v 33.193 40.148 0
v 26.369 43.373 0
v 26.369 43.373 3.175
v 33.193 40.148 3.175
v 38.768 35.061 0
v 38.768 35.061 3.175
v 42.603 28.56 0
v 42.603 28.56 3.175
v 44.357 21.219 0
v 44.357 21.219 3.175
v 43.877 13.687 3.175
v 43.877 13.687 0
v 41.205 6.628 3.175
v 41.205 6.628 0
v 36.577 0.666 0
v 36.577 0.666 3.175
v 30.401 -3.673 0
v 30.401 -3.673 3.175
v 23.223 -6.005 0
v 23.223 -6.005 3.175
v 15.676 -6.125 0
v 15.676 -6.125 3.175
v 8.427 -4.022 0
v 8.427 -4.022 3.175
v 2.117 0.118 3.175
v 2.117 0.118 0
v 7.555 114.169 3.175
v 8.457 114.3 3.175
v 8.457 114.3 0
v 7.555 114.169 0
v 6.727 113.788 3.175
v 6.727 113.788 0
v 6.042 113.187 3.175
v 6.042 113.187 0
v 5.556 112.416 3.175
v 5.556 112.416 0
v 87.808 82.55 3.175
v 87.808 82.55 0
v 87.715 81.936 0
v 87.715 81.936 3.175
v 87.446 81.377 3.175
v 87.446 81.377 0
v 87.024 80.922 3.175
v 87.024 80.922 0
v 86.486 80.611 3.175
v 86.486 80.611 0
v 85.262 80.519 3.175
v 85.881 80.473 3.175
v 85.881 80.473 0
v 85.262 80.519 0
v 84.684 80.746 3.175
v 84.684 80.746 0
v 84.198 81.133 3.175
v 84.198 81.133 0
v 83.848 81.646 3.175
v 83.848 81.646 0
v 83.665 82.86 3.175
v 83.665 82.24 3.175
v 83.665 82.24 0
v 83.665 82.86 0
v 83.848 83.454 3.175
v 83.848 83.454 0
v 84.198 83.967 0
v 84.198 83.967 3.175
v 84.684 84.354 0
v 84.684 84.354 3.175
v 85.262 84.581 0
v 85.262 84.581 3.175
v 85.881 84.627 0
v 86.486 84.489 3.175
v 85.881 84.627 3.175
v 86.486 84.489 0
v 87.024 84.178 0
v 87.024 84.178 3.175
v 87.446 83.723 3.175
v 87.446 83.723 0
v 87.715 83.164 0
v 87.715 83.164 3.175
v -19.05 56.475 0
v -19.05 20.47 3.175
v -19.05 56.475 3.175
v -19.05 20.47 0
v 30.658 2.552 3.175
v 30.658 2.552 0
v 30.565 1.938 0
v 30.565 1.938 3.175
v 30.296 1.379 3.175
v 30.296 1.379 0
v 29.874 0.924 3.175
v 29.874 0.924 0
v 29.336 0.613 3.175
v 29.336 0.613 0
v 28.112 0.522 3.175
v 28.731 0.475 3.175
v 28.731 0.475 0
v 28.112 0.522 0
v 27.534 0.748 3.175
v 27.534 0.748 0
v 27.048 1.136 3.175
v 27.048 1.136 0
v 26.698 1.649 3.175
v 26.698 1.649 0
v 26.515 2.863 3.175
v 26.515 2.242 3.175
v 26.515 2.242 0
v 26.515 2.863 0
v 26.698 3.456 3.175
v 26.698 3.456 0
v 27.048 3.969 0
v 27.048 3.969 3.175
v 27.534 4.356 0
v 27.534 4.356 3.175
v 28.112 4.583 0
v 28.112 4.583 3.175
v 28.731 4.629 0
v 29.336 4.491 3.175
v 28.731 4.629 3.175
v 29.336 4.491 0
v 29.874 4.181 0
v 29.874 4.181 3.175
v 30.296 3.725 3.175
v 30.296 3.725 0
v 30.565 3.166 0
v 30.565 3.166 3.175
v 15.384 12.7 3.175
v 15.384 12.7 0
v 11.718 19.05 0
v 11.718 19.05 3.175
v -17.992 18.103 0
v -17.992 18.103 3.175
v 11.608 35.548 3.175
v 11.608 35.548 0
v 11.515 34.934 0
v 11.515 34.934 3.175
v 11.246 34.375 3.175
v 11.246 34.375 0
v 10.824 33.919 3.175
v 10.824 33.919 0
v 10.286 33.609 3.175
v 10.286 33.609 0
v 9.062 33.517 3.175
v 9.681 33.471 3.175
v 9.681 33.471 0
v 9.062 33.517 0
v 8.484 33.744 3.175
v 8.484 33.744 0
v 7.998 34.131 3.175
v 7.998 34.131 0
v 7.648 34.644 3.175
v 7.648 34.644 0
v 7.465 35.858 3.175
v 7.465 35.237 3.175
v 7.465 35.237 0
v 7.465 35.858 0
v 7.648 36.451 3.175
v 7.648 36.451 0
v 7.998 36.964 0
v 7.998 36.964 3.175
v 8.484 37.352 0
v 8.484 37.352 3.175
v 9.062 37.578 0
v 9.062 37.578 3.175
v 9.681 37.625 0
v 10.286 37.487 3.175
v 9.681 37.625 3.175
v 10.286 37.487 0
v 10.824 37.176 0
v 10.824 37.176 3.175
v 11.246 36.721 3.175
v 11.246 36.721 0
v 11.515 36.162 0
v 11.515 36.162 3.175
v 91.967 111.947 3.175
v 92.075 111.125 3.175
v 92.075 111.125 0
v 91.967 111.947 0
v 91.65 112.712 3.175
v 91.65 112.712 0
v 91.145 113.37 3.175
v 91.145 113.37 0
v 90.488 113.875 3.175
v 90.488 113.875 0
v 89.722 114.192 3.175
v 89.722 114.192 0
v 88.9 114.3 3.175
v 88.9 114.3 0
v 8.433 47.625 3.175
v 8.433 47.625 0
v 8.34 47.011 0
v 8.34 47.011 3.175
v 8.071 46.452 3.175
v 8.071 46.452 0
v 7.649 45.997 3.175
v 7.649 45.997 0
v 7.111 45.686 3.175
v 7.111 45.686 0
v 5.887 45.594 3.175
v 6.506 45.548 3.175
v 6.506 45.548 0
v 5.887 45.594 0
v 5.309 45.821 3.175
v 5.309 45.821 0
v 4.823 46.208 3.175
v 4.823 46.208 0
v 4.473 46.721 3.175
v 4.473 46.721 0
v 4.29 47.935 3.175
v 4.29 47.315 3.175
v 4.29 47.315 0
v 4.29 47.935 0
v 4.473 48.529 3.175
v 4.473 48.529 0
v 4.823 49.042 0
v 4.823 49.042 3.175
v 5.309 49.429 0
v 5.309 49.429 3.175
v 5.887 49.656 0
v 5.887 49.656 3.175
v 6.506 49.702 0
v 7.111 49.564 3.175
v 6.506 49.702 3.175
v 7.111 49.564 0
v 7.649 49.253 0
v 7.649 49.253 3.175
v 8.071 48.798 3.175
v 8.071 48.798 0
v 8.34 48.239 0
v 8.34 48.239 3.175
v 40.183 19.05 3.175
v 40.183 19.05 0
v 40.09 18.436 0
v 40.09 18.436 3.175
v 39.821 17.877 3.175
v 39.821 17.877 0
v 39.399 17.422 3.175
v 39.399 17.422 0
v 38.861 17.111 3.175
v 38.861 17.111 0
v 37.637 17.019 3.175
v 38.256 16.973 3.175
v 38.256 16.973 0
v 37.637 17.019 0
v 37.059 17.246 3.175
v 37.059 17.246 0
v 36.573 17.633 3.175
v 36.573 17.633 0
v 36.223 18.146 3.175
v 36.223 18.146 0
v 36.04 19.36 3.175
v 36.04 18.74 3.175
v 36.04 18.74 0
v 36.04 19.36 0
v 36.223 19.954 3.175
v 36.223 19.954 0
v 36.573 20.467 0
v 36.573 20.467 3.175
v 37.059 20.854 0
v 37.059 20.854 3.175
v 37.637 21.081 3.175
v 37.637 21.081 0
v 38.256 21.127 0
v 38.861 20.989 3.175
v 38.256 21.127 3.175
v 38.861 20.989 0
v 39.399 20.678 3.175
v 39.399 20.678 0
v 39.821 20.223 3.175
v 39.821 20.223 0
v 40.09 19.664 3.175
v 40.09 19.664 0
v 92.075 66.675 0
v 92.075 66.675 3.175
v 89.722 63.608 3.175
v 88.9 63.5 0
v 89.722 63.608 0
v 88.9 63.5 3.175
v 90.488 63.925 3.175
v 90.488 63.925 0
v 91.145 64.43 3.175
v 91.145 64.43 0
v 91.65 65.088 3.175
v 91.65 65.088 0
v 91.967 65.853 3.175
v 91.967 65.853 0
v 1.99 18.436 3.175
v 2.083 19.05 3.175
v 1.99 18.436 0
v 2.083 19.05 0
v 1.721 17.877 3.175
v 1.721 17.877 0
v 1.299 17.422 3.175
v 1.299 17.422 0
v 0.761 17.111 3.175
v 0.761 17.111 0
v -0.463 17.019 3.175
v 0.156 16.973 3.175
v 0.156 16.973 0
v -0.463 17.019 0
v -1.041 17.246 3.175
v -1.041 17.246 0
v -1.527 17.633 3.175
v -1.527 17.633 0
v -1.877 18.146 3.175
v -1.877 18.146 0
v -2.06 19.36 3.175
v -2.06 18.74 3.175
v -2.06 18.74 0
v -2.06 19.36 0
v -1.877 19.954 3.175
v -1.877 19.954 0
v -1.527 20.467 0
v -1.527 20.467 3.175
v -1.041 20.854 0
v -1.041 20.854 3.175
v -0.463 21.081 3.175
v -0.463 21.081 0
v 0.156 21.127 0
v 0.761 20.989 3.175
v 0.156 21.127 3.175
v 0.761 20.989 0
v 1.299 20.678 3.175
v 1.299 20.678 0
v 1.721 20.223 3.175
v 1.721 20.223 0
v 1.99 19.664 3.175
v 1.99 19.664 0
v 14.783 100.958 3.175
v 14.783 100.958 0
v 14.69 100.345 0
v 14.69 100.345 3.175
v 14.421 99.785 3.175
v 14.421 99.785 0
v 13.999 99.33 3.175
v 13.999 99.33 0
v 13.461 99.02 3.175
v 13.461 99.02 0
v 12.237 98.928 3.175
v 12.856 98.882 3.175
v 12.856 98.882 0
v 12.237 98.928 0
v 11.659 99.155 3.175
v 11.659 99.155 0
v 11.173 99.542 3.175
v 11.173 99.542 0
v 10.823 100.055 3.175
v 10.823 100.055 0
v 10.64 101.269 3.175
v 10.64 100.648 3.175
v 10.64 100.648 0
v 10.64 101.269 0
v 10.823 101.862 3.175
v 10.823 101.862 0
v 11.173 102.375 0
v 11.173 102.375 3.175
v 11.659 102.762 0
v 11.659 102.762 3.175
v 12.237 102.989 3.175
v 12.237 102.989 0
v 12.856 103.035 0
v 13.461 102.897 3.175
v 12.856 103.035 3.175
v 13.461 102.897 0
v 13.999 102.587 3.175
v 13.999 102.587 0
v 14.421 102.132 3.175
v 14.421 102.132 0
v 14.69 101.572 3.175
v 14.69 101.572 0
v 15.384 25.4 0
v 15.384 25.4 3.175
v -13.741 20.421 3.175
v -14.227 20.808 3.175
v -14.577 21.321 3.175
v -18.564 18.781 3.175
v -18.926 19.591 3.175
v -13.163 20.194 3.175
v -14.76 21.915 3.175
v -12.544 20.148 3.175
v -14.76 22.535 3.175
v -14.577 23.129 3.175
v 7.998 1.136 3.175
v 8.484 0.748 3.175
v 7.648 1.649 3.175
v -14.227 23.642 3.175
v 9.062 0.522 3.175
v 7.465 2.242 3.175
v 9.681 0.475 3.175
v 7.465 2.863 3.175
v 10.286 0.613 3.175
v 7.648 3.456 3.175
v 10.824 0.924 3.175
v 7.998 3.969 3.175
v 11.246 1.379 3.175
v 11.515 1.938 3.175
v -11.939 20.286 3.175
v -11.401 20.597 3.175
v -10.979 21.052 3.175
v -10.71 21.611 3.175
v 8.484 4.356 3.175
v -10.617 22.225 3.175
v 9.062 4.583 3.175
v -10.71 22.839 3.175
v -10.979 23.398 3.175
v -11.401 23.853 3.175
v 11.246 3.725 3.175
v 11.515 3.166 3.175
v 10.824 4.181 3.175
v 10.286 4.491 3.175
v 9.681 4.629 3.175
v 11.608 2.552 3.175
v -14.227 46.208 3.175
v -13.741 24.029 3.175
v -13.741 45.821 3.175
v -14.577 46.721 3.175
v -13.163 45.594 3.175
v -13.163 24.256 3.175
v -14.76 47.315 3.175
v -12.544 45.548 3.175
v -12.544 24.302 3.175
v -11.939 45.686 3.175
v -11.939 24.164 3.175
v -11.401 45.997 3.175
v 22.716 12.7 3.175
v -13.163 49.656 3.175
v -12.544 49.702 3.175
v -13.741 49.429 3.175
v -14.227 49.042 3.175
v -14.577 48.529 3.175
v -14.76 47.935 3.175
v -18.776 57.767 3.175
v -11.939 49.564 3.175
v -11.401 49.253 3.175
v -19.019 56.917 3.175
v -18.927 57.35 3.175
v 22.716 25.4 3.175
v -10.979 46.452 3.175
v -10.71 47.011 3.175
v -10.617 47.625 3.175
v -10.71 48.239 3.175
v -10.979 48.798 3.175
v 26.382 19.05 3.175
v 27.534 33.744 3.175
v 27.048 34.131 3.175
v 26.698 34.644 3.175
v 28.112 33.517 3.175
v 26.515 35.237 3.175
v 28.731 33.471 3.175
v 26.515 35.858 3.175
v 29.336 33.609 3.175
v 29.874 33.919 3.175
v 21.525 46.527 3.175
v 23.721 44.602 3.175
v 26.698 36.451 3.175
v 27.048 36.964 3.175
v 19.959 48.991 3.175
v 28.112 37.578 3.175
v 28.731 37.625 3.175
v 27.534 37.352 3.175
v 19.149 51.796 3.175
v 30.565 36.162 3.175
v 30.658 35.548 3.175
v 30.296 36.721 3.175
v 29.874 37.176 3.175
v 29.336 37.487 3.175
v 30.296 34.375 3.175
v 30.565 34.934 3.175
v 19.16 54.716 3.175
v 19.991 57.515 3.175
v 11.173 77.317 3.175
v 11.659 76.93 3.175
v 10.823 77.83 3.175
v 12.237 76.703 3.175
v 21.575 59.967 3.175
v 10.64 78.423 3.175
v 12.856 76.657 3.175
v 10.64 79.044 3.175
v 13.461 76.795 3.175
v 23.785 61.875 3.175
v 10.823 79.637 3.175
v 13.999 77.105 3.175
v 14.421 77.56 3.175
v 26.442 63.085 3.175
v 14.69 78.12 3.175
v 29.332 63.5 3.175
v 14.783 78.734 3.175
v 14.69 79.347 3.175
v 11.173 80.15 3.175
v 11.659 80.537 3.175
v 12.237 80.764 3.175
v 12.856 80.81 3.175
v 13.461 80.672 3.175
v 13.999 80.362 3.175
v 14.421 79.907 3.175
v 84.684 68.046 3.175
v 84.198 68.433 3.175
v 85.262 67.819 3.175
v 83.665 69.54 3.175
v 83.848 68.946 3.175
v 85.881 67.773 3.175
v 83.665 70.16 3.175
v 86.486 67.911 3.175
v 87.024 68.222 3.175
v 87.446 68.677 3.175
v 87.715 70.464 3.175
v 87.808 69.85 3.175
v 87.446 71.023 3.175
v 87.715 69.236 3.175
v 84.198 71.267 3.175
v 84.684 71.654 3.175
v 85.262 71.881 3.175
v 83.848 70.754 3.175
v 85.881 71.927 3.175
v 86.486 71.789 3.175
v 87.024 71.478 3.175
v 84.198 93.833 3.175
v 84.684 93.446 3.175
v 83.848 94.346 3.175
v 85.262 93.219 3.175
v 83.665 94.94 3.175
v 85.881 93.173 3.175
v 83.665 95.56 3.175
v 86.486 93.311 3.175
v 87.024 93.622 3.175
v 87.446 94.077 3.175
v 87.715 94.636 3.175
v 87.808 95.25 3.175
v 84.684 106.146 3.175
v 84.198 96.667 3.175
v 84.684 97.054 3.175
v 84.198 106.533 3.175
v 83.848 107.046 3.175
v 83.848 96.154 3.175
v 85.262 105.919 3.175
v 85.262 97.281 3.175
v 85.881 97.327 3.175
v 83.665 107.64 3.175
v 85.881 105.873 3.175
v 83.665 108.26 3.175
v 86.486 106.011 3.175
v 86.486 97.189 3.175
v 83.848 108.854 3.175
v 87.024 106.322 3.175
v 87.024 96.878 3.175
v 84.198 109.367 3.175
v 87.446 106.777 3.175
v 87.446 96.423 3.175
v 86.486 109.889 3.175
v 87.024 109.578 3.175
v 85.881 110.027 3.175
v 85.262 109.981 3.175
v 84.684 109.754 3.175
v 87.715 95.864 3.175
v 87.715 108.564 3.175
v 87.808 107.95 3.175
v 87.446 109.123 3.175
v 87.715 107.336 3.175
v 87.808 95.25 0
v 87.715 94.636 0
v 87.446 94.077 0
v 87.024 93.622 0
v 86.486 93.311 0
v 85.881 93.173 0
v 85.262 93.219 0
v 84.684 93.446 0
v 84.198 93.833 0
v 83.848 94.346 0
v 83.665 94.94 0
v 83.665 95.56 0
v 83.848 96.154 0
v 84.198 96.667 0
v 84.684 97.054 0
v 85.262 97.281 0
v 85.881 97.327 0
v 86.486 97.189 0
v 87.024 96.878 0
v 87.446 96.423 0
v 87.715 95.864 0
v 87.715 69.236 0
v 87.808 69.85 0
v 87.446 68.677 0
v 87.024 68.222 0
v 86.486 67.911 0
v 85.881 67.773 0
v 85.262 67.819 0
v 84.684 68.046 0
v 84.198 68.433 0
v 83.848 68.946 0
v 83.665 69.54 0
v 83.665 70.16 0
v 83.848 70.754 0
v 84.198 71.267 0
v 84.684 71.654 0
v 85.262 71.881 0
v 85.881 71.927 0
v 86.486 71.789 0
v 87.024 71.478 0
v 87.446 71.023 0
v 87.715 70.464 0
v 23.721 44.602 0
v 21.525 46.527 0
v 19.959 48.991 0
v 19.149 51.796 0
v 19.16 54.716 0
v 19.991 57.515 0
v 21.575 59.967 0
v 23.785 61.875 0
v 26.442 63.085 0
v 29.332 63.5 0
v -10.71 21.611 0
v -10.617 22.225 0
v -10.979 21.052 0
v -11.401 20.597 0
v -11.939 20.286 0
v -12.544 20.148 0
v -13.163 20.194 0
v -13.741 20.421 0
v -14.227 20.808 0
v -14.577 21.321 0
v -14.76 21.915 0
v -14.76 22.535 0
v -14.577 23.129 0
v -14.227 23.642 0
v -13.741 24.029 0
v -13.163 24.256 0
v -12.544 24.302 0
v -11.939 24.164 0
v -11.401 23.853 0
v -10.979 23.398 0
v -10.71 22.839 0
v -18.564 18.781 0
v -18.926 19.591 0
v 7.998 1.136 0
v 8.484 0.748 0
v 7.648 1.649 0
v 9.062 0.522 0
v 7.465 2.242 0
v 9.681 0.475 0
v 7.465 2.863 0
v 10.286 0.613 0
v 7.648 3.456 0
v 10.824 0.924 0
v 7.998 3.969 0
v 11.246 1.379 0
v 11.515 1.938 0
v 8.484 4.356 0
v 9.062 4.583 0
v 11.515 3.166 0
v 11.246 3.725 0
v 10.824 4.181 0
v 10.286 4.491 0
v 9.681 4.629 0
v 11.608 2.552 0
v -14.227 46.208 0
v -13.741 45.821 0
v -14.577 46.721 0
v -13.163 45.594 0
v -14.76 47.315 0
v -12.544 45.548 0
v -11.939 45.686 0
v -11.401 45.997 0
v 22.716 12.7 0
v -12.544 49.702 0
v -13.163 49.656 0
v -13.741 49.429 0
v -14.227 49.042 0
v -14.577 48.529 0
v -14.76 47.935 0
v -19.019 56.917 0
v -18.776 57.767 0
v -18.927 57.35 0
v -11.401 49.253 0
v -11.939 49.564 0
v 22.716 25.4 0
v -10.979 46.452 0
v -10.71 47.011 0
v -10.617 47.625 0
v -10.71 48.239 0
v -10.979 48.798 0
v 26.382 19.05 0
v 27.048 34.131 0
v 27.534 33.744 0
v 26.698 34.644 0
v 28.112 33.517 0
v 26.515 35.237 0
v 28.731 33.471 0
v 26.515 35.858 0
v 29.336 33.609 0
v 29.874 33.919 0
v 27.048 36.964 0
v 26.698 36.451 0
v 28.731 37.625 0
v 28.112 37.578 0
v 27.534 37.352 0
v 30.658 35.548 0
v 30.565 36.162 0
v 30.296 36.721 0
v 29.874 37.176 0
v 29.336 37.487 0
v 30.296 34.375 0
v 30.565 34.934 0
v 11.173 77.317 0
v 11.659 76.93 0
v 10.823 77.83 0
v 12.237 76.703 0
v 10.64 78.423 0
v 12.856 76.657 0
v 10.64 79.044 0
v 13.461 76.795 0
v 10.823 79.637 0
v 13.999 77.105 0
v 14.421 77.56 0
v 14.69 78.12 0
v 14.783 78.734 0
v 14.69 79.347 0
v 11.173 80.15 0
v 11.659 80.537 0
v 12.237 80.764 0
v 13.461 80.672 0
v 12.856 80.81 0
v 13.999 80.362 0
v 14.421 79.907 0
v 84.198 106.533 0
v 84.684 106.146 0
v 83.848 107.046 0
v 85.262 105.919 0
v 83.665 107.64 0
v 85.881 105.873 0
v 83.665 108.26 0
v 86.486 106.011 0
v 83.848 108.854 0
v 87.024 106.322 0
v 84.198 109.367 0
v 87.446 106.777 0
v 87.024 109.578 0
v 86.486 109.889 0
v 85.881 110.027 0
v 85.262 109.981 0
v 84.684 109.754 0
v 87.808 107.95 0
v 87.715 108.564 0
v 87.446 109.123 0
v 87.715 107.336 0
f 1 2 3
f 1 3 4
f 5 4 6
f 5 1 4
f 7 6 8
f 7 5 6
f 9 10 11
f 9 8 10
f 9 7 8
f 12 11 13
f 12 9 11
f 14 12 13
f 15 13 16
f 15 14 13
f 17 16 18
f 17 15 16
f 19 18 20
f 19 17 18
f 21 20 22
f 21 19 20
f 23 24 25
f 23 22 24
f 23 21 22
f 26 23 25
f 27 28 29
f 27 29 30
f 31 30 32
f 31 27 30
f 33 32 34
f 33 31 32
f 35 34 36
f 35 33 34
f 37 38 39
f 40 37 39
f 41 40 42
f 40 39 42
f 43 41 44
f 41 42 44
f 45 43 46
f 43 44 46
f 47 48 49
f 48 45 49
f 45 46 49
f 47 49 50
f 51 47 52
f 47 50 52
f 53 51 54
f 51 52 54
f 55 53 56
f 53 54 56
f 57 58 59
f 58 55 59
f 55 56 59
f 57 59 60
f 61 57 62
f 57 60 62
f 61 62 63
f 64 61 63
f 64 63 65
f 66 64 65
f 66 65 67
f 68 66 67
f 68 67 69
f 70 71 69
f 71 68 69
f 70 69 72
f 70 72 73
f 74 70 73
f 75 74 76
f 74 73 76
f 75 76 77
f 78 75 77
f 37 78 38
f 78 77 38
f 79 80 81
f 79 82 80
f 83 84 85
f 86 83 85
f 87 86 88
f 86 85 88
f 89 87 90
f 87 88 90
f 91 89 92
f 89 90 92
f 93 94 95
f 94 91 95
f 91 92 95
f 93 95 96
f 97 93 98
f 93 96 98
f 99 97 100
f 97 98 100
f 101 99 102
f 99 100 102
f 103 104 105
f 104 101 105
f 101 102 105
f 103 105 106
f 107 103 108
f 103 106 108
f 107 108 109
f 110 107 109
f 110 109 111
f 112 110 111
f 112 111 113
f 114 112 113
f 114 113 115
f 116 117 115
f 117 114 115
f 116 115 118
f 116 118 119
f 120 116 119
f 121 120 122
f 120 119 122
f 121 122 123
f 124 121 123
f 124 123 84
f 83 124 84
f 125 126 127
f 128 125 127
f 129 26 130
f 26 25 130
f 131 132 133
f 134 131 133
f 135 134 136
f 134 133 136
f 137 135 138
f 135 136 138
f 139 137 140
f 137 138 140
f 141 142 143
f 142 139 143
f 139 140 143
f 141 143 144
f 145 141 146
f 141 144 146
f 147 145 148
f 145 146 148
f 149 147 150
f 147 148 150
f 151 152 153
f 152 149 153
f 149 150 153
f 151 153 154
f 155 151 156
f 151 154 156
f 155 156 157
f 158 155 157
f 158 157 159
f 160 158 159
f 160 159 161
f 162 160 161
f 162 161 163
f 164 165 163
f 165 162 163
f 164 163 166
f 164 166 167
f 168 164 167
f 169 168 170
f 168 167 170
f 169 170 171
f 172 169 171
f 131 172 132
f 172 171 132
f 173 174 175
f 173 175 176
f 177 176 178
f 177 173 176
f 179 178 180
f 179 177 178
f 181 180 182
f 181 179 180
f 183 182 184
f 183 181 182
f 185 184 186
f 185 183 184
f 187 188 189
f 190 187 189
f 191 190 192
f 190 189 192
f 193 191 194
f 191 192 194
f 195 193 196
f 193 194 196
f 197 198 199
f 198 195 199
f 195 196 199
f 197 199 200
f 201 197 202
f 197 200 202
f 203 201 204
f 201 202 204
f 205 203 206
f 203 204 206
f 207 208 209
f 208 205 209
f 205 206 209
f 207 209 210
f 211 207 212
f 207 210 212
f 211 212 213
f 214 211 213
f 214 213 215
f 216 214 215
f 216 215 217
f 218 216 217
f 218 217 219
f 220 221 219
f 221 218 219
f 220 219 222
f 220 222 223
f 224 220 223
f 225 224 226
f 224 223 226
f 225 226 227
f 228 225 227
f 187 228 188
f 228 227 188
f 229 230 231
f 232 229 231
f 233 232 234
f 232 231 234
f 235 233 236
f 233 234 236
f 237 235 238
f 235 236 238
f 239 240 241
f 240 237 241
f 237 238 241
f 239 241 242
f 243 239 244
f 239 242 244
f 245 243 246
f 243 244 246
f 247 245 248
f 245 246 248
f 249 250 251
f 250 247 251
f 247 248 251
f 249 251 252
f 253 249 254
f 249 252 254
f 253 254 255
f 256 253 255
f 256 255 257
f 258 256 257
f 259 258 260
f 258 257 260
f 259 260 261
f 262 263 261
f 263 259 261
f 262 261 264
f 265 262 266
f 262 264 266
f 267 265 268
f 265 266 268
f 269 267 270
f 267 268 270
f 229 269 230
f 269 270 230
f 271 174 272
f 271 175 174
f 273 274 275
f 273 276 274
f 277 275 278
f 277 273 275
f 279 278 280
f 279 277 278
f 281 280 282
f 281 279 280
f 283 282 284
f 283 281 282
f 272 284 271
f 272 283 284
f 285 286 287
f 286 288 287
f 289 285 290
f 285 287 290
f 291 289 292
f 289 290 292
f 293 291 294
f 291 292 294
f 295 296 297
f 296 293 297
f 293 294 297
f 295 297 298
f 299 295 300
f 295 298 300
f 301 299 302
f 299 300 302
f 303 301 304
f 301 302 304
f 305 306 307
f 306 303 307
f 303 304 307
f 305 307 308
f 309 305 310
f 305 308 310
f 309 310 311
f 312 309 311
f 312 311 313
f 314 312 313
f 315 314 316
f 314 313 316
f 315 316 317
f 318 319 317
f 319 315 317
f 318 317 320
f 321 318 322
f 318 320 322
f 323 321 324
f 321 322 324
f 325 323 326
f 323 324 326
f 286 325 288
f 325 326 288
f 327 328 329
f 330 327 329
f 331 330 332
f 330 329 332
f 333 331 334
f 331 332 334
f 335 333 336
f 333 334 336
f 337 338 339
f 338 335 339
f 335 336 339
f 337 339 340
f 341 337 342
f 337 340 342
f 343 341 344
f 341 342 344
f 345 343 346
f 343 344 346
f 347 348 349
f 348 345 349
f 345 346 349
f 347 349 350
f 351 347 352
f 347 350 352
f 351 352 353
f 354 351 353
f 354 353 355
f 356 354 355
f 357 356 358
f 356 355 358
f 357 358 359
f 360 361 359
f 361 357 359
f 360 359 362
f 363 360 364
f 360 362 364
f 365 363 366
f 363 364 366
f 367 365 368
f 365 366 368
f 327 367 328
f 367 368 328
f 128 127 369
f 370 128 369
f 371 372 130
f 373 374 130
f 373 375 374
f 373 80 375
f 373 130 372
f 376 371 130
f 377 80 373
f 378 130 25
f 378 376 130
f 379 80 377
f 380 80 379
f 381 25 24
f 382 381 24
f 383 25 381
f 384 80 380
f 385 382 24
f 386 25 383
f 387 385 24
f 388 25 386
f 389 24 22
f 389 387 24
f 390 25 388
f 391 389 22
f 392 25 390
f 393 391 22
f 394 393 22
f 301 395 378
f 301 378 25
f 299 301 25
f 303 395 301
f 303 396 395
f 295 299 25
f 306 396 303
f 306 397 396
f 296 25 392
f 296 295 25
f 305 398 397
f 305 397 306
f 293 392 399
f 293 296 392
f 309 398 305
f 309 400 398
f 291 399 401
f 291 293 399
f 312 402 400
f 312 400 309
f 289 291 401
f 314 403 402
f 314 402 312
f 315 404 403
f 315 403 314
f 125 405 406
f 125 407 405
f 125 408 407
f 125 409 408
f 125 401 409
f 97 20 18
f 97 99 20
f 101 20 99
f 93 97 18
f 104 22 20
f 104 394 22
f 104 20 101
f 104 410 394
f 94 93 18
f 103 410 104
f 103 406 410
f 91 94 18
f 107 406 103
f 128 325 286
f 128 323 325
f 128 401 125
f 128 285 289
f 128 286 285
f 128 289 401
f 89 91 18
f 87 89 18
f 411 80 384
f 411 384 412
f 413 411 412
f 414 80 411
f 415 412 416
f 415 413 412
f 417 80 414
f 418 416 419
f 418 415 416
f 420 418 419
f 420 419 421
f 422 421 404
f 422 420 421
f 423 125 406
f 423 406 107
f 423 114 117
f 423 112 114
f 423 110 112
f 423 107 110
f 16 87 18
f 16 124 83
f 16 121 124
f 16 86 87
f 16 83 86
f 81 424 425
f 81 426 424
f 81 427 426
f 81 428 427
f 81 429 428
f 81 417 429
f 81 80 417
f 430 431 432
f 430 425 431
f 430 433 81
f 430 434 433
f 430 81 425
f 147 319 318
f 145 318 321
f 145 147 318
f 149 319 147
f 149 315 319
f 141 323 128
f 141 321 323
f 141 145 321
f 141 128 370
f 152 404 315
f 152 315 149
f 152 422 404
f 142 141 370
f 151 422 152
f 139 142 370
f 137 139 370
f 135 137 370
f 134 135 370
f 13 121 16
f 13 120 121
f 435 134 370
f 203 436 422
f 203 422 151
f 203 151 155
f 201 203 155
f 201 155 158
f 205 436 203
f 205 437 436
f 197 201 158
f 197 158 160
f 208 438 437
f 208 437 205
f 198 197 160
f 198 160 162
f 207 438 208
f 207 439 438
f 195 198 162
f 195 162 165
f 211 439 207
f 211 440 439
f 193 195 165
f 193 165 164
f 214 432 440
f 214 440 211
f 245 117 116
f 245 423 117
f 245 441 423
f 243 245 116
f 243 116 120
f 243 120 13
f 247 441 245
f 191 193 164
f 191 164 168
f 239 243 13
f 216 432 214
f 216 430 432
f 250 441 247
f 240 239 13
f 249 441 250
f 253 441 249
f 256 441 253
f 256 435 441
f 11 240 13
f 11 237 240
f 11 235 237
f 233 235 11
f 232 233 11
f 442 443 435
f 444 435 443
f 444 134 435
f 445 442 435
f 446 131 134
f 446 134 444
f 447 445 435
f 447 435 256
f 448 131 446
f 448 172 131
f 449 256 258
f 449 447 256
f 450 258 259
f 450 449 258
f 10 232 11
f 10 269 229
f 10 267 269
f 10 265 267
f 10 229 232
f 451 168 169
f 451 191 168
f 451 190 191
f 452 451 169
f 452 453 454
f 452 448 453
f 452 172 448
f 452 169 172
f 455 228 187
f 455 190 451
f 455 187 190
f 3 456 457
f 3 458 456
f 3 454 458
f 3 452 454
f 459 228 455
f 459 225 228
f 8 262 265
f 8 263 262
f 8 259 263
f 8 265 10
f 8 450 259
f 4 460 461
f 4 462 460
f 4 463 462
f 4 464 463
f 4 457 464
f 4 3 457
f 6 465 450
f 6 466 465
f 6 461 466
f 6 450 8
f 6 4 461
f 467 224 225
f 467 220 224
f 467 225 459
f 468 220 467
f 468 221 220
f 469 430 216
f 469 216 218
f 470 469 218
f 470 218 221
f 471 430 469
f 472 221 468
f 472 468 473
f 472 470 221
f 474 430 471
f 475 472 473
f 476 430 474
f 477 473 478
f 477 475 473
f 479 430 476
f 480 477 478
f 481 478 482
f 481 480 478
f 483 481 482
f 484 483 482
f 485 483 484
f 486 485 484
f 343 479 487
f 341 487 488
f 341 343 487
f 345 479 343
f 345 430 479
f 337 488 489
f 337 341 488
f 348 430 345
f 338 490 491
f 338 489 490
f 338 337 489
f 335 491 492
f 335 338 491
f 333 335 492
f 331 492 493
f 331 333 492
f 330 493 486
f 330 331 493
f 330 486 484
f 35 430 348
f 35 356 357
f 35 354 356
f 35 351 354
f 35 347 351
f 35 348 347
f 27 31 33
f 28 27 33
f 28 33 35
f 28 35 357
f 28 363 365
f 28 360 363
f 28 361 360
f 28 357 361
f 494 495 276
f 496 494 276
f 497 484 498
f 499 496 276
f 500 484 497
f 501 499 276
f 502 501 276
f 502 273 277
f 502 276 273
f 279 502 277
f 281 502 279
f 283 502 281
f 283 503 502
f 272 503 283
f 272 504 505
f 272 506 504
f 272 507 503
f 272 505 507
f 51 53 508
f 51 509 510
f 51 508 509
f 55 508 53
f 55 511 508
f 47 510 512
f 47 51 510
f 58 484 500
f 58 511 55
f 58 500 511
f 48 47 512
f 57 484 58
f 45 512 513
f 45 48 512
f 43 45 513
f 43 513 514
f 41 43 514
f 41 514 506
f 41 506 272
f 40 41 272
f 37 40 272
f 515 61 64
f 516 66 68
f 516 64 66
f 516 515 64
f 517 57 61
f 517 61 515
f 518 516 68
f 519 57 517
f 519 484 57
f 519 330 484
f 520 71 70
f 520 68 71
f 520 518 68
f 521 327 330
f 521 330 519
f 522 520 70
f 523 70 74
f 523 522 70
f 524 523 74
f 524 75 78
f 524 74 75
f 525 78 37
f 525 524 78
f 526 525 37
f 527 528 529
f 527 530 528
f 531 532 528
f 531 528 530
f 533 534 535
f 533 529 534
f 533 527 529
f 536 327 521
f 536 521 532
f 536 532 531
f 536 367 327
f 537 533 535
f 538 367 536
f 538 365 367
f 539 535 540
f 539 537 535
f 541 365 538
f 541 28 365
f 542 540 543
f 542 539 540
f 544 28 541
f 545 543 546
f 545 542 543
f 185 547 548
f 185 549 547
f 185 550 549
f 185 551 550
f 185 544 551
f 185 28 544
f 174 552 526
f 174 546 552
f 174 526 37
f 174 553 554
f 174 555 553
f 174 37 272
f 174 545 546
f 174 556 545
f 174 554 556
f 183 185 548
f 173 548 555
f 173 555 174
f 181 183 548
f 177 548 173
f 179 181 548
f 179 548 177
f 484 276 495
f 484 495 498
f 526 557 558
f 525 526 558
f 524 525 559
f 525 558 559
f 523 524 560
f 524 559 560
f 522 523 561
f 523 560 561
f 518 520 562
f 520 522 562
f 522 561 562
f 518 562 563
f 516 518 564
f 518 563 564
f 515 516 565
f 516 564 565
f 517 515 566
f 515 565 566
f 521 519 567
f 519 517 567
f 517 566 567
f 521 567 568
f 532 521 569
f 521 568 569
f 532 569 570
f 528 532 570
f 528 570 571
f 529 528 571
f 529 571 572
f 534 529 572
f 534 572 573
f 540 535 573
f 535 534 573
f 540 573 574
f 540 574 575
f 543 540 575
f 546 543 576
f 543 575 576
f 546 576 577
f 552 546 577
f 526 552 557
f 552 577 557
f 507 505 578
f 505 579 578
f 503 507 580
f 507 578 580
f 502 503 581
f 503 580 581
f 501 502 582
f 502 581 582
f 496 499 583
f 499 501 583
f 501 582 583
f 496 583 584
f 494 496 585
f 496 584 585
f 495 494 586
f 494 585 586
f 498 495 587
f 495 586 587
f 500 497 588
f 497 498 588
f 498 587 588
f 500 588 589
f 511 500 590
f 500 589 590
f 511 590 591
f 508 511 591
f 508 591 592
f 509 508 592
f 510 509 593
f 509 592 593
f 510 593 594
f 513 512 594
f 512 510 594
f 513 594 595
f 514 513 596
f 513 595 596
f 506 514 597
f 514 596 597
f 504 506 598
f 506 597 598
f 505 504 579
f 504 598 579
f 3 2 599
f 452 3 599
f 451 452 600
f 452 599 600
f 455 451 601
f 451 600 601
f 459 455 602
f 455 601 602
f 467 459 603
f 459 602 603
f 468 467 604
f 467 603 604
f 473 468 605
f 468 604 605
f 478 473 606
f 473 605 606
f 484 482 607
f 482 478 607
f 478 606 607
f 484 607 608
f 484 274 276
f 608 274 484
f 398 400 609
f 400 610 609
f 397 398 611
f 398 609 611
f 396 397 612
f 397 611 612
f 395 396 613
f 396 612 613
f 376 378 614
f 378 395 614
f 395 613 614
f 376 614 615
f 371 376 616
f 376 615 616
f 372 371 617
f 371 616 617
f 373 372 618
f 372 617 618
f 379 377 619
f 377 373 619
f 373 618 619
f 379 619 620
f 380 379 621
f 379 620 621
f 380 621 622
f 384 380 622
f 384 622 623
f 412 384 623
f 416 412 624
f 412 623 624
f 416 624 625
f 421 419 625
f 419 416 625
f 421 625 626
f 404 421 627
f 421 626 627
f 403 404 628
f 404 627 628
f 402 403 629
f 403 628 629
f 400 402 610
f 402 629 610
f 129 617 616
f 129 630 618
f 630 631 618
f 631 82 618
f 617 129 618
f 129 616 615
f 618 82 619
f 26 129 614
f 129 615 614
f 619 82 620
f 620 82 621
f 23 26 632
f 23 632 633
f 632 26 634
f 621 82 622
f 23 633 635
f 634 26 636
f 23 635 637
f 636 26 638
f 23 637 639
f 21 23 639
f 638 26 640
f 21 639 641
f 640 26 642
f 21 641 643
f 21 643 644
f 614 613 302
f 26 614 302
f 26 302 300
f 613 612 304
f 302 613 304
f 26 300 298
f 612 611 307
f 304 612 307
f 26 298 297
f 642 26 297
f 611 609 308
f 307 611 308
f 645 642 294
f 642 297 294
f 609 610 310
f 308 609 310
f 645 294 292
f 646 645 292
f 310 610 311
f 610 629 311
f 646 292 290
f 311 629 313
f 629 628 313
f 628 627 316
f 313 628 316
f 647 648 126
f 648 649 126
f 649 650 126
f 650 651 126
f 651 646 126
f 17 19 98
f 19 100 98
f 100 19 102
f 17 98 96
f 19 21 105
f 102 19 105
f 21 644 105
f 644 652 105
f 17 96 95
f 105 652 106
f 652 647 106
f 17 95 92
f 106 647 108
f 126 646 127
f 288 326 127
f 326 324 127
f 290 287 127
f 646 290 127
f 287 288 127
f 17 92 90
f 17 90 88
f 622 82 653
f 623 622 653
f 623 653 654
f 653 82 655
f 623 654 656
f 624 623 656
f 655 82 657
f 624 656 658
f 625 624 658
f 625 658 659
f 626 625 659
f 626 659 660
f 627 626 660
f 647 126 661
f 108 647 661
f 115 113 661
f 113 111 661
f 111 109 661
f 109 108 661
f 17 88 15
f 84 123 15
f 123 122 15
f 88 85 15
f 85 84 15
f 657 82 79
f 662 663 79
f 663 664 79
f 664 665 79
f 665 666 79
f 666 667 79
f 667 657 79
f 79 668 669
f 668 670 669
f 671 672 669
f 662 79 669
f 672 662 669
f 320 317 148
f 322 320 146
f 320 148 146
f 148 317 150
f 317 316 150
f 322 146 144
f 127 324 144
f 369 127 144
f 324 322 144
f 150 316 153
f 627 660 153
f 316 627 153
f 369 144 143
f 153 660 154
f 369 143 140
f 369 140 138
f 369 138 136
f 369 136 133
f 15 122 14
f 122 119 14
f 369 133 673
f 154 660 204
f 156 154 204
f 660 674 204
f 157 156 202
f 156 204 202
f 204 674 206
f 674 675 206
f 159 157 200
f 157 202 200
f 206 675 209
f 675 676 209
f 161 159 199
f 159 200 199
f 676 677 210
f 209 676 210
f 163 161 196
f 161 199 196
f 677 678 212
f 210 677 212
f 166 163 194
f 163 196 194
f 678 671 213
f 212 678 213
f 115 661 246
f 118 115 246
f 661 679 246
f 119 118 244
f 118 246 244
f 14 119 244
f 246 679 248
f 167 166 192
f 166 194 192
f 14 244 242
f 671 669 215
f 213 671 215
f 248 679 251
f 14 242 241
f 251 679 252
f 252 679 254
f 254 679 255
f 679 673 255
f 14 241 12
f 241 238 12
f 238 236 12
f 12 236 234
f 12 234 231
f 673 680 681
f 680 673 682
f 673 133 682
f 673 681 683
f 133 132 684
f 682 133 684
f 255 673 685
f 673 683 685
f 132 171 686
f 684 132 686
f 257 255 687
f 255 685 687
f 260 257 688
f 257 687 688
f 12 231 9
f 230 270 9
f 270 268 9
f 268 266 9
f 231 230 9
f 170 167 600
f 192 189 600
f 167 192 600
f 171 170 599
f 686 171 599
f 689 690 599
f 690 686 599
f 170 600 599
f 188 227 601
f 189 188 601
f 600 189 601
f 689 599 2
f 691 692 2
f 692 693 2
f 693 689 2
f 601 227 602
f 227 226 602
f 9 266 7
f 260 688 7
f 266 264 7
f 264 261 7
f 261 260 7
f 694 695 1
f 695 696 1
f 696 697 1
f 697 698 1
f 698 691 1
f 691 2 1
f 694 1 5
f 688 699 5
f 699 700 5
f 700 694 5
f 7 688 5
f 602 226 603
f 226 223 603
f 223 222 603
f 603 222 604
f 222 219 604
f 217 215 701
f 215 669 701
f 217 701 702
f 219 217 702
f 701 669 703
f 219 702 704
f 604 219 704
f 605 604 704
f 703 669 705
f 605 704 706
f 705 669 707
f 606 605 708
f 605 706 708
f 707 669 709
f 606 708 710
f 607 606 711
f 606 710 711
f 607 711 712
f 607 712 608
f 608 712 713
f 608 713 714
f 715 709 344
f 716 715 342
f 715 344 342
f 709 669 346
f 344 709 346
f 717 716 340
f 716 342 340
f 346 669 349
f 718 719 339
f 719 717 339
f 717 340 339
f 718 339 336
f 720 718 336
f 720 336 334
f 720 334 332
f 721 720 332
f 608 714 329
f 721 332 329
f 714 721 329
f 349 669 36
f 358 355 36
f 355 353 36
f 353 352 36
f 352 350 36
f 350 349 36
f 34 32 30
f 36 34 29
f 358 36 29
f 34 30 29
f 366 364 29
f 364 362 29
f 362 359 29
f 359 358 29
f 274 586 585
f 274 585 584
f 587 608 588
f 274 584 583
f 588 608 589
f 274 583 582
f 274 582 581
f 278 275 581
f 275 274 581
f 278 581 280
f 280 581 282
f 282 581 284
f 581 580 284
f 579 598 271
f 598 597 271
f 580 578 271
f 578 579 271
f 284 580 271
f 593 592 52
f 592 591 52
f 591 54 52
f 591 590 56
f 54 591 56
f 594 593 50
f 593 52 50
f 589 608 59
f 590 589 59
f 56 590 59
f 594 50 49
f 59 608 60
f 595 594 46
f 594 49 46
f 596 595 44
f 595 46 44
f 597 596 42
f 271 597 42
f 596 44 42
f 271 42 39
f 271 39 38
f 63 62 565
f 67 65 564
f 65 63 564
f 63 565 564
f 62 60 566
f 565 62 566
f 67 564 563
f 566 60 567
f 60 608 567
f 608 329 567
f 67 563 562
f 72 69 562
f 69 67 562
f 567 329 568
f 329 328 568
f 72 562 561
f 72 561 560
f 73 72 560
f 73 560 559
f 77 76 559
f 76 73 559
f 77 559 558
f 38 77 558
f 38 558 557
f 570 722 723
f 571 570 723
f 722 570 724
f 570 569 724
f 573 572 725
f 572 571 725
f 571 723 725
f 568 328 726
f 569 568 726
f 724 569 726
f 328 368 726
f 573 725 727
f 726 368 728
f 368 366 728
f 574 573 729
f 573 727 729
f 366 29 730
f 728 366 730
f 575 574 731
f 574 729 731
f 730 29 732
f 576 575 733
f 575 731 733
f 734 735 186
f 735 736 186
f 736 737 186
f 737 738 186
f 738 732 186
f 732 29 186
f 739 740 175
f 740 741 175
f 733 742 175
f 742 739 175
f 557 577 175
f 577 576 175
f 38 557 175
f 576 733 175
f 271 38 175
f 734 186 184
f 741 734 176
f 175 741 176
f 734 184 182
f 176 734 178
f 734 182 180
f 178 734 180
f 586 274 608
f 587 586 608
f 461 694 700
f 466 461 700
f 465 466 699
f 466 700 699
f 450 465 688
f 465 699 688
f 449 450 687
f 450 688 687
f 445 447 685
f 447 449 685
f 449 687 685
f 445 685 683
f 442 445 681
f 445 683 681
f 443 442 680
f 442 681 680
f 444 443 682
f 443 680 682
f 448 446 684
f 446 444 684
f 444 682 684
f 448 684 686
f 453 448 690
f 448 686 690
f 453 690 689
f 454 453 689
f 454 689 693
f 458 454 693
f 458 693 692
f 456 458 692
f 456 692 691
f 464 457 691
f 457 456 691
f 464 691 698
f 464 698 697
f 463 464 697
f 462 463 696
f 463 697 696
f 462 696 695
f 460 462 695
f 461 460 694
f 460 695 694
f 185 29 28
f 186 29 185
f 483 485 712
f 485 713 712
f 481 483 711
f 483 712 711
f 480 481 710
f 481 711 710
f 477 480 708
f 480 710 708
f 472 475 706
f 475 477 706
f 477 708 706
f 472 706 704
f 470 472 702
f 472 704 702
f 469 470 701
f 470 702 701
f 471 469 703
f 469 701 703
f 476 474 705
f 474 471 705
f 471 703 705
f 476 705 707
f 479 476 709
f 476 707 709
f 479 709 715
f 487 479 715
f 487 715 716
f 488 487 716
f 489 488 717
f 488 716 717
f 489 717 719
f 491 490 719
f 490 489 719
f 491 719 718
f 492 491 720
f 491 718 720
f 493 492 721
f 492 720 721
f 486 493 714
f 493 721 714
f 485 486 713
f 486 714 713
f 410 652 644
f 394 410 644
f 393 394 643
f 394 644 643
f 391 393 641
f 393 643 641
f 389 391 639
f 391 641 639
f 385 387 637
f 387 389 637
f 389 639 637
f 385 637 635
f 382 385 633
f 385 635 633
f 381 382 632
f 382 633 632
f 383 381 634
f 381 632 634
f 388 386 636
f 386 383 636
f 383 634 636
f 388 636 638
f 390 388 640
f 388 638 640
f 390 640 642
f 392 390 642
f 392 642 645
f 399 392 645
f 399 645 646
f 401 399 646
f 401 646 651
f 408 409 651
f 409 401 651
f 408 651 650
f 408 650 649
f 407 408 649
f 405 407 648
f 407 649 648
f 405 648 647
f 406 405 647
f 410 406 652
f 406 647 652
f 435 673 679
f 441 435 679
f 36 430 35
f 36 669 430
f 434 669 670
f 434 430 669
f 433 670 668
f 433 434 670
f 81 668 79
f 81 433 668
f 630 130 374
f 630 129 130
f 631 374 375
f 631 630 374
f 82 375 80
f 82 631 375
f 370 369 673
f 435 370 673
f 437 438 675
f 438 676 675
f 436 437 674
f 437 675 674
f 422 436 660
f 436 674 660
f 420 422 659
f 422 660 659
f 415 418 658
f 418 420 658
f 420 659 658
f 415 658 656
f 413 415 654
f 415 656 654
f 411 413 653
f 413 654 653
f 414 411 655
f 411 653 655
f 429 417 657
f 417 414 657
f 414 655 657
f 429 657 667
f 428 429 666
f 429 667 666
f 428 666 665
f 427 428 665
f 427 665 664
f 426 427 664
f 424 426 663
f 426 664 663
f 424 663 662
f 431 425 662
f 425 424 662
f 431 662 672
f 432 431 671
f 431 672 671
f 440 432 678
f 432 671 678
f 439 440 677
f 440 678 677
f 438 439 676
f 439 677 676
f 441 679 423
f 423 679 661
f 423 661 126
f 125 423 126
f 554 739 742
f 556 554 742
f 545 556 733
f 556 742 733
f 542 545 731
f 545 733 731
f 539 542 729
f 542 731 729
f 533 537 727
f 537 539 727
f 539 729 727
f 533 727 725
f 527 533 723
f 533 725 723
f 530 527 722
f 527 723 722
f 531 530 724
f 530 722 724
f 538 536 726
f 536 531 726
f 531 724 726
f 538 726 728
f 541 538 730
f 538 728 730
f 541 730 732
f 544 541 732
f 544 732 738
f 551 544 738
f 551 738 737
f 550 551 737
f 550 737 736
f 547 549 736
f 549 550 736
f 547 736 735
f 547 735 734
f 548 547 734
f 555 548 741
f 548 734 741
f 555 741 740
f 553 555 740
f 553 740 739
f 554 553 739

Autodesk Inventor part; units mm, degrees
ref_plane "YZ Plane" through (0, 0, 0) normal (1, 0, 0) x (0, 1, 0)
ref_plane "XZ Plane" through (0, 0, 0) normal (0, 1, 0) x (-1, 0, 0)
ref_plane "XY Plane" through (0, 0, 0) normal (0, 0, 1) x (1, 0, 0)
sketch "Sketch1" plane through (0, 0, 0) normal (0, 0, 1) x (1, 0, 0)
  circle A0 centre (19.05, 19.05) radius 7.9375
  line L0 (22.7162, 25.4) -> (26.3823, 19.05)
  line L1 (26.3823, 19.05) -> (22.7162, 12.7)
  line L2 (22.7162, 12.7) -> (15.3838, 12.7)
  line L3 (15.3838, 12.7) -> (11.7177, 19.05)
  line L4 (11.7177, 19.05) -> (15.3838, 25.4)
  line L5 (15.3838, 25.4) -> (22.7162, 25.4)
  circle A1 centre (0, 19.05) radius 2.0828
  line L6 (0, 19.05) -> (19.05, 19.05) construction
  circle A2 centre (9.525, 2.5522) radius 2.0828
  circle A3 centre (28.575, 2.5522) radius 2.0828
  circle A4 centre (38.1, 19.05) radius 2.0828
  circle A5 centre (28.575, 35.5478) radius 2.0828
  circle A6 centre (9.525, 35.5478) radius 2.0828
  circle A7 centre (19.05, 19.05) radius 25.4
  line L7 (19.05, -6.35) -> (-19.05, -6.35)
  line L8 (-19.05, -6.35) -> (-19.05, 57.15)
  line L9 (6.3948, 114.3) -> (92.075, 114.3)
  line L10 (92.075, 114.3) -> (92.075, 63.5)
  line L11 (92.075, 63.5) -> (29.3317, 63.5)
  line L12 (-121.3454, 55.7276) -> (199.3502, 55.7276) construction
  arc A8 (29.3317, 63.5) -> (26.369, 43.3727) centre (29.3317, 53.2183) ccw
  circle A9 centre (85.725, 69.85) radius 2.0828
  circle A10 centre (85.725, 82.55) radius 2.0828
  circle A11 centre (85.725, 95.25) radius 2.0828
  circle A12 centre (85.725, 107.95) radius 2.0828
  line L13 (29.3317, 53.2183) -> (19.05, 53.2183) construction
  line L14 (-19.05, 57.15) -> (6.3948, 114.3)
  circle A13 centre (-12.7, 47.625) radius 2.0828
  circle A14 centre (6.35, 47.625) radius 2.0828
  circle A15 centre (-12.7, 22.225) radius 2.0828
  circle A16 centre (12.7, 78.7335) radius 2.0828
  circle A17 centre (12.7, 100.9585) radius 2.0828
  point P0 (0, 0)
  point P1 (19.05, 44.45)
  dimension "d7" = 15.875
  dimension "d8" = 12.7
  dimension "d23" = 4.1656
  dimension "d25" = 19.05
  dimension "d26" = 0
  dimension "d29" = 360
  dimension "d41" = 50.8
  dimension "d42" = 19.05
  dimension "d43" = 19.05
  dimension "d44" = 38.1
  dimension "d55" = 73.025
  dimension "d57" = 4.1656
  dimension "d58" = 6.35
  dimension "d59" = 6.35
  dimension "d62" = 12.7
  dimension "d67" = 6.35
  dimension "d68" = 36.6776
  dimension "d69" = 50.8
  dimension "d70" = 38.1
  dimension "d71" = 114
  dimension "d72" = 57.15
  dimension "d76" = 56.3933
  dimension "d78" = 6.35
  dimension "d79" = 9.525
  dimension "d84" = 19.05
  dimension "d91" = 31.75
  dimension "d98" = 25.4
  dimension "d105" = 22.225
  dimension "d113" = 6.35
extrude "Extrusion1" add sketch "Sketch1" along normal blind 3.175 contours A0 | A7 | A7 L7 L8 L14 L9 L10 L11 A8
sketch "Sketch2" plane through (0, 0, 3.175) normal (0, 0, 1) x (1, 0, 0)
  line L0 (-19.05, -6.35) -> (19.05, -6.35) projected
  arc A0 (19.05, -6.35) -> (26.369, 43.3727) centre (19.05, 19.05) ccw projected
  line L1 (-19.05, 57.15) -> (-19.05, -6.35) projected
  circle A1 centre (19.05, 19.05) radius 25.4
  line L2 (2.1167, 0.118) -> (-19.05, 19.05)
  line L3 (-19.05, 19.05) -> (-19.05, -6.35)
  line L4 (-19.05, -6.35) -> (19.05, -6.35)
  arc A2 (2.1167, 0.118) -> (19.05, -6.35) centre (19.05, 19.05) ccw
  point P0 (-19.05, 56.4751)
  point P1 (0, 0)
  dimension "d110" = 25.4
extrude "Extrusion2" cut sketch "Sketch2" against normal blind 25.4 contours L1 L2 A1 L0
fillet "Fillet2" radius 3.175 5 edges at (6.3948, 114.3, 1.5875) (-19.05, 57.15, 1.5875) (-19.05, 19.05, 1.5875) (92.075, 63.5, 1.5875) (92.075, 114.3, 1.5875)
equation "\"d67\" = d58"
properties part number "Lexan flexible Arm Mount" material "Polycarbonate, Clear"
